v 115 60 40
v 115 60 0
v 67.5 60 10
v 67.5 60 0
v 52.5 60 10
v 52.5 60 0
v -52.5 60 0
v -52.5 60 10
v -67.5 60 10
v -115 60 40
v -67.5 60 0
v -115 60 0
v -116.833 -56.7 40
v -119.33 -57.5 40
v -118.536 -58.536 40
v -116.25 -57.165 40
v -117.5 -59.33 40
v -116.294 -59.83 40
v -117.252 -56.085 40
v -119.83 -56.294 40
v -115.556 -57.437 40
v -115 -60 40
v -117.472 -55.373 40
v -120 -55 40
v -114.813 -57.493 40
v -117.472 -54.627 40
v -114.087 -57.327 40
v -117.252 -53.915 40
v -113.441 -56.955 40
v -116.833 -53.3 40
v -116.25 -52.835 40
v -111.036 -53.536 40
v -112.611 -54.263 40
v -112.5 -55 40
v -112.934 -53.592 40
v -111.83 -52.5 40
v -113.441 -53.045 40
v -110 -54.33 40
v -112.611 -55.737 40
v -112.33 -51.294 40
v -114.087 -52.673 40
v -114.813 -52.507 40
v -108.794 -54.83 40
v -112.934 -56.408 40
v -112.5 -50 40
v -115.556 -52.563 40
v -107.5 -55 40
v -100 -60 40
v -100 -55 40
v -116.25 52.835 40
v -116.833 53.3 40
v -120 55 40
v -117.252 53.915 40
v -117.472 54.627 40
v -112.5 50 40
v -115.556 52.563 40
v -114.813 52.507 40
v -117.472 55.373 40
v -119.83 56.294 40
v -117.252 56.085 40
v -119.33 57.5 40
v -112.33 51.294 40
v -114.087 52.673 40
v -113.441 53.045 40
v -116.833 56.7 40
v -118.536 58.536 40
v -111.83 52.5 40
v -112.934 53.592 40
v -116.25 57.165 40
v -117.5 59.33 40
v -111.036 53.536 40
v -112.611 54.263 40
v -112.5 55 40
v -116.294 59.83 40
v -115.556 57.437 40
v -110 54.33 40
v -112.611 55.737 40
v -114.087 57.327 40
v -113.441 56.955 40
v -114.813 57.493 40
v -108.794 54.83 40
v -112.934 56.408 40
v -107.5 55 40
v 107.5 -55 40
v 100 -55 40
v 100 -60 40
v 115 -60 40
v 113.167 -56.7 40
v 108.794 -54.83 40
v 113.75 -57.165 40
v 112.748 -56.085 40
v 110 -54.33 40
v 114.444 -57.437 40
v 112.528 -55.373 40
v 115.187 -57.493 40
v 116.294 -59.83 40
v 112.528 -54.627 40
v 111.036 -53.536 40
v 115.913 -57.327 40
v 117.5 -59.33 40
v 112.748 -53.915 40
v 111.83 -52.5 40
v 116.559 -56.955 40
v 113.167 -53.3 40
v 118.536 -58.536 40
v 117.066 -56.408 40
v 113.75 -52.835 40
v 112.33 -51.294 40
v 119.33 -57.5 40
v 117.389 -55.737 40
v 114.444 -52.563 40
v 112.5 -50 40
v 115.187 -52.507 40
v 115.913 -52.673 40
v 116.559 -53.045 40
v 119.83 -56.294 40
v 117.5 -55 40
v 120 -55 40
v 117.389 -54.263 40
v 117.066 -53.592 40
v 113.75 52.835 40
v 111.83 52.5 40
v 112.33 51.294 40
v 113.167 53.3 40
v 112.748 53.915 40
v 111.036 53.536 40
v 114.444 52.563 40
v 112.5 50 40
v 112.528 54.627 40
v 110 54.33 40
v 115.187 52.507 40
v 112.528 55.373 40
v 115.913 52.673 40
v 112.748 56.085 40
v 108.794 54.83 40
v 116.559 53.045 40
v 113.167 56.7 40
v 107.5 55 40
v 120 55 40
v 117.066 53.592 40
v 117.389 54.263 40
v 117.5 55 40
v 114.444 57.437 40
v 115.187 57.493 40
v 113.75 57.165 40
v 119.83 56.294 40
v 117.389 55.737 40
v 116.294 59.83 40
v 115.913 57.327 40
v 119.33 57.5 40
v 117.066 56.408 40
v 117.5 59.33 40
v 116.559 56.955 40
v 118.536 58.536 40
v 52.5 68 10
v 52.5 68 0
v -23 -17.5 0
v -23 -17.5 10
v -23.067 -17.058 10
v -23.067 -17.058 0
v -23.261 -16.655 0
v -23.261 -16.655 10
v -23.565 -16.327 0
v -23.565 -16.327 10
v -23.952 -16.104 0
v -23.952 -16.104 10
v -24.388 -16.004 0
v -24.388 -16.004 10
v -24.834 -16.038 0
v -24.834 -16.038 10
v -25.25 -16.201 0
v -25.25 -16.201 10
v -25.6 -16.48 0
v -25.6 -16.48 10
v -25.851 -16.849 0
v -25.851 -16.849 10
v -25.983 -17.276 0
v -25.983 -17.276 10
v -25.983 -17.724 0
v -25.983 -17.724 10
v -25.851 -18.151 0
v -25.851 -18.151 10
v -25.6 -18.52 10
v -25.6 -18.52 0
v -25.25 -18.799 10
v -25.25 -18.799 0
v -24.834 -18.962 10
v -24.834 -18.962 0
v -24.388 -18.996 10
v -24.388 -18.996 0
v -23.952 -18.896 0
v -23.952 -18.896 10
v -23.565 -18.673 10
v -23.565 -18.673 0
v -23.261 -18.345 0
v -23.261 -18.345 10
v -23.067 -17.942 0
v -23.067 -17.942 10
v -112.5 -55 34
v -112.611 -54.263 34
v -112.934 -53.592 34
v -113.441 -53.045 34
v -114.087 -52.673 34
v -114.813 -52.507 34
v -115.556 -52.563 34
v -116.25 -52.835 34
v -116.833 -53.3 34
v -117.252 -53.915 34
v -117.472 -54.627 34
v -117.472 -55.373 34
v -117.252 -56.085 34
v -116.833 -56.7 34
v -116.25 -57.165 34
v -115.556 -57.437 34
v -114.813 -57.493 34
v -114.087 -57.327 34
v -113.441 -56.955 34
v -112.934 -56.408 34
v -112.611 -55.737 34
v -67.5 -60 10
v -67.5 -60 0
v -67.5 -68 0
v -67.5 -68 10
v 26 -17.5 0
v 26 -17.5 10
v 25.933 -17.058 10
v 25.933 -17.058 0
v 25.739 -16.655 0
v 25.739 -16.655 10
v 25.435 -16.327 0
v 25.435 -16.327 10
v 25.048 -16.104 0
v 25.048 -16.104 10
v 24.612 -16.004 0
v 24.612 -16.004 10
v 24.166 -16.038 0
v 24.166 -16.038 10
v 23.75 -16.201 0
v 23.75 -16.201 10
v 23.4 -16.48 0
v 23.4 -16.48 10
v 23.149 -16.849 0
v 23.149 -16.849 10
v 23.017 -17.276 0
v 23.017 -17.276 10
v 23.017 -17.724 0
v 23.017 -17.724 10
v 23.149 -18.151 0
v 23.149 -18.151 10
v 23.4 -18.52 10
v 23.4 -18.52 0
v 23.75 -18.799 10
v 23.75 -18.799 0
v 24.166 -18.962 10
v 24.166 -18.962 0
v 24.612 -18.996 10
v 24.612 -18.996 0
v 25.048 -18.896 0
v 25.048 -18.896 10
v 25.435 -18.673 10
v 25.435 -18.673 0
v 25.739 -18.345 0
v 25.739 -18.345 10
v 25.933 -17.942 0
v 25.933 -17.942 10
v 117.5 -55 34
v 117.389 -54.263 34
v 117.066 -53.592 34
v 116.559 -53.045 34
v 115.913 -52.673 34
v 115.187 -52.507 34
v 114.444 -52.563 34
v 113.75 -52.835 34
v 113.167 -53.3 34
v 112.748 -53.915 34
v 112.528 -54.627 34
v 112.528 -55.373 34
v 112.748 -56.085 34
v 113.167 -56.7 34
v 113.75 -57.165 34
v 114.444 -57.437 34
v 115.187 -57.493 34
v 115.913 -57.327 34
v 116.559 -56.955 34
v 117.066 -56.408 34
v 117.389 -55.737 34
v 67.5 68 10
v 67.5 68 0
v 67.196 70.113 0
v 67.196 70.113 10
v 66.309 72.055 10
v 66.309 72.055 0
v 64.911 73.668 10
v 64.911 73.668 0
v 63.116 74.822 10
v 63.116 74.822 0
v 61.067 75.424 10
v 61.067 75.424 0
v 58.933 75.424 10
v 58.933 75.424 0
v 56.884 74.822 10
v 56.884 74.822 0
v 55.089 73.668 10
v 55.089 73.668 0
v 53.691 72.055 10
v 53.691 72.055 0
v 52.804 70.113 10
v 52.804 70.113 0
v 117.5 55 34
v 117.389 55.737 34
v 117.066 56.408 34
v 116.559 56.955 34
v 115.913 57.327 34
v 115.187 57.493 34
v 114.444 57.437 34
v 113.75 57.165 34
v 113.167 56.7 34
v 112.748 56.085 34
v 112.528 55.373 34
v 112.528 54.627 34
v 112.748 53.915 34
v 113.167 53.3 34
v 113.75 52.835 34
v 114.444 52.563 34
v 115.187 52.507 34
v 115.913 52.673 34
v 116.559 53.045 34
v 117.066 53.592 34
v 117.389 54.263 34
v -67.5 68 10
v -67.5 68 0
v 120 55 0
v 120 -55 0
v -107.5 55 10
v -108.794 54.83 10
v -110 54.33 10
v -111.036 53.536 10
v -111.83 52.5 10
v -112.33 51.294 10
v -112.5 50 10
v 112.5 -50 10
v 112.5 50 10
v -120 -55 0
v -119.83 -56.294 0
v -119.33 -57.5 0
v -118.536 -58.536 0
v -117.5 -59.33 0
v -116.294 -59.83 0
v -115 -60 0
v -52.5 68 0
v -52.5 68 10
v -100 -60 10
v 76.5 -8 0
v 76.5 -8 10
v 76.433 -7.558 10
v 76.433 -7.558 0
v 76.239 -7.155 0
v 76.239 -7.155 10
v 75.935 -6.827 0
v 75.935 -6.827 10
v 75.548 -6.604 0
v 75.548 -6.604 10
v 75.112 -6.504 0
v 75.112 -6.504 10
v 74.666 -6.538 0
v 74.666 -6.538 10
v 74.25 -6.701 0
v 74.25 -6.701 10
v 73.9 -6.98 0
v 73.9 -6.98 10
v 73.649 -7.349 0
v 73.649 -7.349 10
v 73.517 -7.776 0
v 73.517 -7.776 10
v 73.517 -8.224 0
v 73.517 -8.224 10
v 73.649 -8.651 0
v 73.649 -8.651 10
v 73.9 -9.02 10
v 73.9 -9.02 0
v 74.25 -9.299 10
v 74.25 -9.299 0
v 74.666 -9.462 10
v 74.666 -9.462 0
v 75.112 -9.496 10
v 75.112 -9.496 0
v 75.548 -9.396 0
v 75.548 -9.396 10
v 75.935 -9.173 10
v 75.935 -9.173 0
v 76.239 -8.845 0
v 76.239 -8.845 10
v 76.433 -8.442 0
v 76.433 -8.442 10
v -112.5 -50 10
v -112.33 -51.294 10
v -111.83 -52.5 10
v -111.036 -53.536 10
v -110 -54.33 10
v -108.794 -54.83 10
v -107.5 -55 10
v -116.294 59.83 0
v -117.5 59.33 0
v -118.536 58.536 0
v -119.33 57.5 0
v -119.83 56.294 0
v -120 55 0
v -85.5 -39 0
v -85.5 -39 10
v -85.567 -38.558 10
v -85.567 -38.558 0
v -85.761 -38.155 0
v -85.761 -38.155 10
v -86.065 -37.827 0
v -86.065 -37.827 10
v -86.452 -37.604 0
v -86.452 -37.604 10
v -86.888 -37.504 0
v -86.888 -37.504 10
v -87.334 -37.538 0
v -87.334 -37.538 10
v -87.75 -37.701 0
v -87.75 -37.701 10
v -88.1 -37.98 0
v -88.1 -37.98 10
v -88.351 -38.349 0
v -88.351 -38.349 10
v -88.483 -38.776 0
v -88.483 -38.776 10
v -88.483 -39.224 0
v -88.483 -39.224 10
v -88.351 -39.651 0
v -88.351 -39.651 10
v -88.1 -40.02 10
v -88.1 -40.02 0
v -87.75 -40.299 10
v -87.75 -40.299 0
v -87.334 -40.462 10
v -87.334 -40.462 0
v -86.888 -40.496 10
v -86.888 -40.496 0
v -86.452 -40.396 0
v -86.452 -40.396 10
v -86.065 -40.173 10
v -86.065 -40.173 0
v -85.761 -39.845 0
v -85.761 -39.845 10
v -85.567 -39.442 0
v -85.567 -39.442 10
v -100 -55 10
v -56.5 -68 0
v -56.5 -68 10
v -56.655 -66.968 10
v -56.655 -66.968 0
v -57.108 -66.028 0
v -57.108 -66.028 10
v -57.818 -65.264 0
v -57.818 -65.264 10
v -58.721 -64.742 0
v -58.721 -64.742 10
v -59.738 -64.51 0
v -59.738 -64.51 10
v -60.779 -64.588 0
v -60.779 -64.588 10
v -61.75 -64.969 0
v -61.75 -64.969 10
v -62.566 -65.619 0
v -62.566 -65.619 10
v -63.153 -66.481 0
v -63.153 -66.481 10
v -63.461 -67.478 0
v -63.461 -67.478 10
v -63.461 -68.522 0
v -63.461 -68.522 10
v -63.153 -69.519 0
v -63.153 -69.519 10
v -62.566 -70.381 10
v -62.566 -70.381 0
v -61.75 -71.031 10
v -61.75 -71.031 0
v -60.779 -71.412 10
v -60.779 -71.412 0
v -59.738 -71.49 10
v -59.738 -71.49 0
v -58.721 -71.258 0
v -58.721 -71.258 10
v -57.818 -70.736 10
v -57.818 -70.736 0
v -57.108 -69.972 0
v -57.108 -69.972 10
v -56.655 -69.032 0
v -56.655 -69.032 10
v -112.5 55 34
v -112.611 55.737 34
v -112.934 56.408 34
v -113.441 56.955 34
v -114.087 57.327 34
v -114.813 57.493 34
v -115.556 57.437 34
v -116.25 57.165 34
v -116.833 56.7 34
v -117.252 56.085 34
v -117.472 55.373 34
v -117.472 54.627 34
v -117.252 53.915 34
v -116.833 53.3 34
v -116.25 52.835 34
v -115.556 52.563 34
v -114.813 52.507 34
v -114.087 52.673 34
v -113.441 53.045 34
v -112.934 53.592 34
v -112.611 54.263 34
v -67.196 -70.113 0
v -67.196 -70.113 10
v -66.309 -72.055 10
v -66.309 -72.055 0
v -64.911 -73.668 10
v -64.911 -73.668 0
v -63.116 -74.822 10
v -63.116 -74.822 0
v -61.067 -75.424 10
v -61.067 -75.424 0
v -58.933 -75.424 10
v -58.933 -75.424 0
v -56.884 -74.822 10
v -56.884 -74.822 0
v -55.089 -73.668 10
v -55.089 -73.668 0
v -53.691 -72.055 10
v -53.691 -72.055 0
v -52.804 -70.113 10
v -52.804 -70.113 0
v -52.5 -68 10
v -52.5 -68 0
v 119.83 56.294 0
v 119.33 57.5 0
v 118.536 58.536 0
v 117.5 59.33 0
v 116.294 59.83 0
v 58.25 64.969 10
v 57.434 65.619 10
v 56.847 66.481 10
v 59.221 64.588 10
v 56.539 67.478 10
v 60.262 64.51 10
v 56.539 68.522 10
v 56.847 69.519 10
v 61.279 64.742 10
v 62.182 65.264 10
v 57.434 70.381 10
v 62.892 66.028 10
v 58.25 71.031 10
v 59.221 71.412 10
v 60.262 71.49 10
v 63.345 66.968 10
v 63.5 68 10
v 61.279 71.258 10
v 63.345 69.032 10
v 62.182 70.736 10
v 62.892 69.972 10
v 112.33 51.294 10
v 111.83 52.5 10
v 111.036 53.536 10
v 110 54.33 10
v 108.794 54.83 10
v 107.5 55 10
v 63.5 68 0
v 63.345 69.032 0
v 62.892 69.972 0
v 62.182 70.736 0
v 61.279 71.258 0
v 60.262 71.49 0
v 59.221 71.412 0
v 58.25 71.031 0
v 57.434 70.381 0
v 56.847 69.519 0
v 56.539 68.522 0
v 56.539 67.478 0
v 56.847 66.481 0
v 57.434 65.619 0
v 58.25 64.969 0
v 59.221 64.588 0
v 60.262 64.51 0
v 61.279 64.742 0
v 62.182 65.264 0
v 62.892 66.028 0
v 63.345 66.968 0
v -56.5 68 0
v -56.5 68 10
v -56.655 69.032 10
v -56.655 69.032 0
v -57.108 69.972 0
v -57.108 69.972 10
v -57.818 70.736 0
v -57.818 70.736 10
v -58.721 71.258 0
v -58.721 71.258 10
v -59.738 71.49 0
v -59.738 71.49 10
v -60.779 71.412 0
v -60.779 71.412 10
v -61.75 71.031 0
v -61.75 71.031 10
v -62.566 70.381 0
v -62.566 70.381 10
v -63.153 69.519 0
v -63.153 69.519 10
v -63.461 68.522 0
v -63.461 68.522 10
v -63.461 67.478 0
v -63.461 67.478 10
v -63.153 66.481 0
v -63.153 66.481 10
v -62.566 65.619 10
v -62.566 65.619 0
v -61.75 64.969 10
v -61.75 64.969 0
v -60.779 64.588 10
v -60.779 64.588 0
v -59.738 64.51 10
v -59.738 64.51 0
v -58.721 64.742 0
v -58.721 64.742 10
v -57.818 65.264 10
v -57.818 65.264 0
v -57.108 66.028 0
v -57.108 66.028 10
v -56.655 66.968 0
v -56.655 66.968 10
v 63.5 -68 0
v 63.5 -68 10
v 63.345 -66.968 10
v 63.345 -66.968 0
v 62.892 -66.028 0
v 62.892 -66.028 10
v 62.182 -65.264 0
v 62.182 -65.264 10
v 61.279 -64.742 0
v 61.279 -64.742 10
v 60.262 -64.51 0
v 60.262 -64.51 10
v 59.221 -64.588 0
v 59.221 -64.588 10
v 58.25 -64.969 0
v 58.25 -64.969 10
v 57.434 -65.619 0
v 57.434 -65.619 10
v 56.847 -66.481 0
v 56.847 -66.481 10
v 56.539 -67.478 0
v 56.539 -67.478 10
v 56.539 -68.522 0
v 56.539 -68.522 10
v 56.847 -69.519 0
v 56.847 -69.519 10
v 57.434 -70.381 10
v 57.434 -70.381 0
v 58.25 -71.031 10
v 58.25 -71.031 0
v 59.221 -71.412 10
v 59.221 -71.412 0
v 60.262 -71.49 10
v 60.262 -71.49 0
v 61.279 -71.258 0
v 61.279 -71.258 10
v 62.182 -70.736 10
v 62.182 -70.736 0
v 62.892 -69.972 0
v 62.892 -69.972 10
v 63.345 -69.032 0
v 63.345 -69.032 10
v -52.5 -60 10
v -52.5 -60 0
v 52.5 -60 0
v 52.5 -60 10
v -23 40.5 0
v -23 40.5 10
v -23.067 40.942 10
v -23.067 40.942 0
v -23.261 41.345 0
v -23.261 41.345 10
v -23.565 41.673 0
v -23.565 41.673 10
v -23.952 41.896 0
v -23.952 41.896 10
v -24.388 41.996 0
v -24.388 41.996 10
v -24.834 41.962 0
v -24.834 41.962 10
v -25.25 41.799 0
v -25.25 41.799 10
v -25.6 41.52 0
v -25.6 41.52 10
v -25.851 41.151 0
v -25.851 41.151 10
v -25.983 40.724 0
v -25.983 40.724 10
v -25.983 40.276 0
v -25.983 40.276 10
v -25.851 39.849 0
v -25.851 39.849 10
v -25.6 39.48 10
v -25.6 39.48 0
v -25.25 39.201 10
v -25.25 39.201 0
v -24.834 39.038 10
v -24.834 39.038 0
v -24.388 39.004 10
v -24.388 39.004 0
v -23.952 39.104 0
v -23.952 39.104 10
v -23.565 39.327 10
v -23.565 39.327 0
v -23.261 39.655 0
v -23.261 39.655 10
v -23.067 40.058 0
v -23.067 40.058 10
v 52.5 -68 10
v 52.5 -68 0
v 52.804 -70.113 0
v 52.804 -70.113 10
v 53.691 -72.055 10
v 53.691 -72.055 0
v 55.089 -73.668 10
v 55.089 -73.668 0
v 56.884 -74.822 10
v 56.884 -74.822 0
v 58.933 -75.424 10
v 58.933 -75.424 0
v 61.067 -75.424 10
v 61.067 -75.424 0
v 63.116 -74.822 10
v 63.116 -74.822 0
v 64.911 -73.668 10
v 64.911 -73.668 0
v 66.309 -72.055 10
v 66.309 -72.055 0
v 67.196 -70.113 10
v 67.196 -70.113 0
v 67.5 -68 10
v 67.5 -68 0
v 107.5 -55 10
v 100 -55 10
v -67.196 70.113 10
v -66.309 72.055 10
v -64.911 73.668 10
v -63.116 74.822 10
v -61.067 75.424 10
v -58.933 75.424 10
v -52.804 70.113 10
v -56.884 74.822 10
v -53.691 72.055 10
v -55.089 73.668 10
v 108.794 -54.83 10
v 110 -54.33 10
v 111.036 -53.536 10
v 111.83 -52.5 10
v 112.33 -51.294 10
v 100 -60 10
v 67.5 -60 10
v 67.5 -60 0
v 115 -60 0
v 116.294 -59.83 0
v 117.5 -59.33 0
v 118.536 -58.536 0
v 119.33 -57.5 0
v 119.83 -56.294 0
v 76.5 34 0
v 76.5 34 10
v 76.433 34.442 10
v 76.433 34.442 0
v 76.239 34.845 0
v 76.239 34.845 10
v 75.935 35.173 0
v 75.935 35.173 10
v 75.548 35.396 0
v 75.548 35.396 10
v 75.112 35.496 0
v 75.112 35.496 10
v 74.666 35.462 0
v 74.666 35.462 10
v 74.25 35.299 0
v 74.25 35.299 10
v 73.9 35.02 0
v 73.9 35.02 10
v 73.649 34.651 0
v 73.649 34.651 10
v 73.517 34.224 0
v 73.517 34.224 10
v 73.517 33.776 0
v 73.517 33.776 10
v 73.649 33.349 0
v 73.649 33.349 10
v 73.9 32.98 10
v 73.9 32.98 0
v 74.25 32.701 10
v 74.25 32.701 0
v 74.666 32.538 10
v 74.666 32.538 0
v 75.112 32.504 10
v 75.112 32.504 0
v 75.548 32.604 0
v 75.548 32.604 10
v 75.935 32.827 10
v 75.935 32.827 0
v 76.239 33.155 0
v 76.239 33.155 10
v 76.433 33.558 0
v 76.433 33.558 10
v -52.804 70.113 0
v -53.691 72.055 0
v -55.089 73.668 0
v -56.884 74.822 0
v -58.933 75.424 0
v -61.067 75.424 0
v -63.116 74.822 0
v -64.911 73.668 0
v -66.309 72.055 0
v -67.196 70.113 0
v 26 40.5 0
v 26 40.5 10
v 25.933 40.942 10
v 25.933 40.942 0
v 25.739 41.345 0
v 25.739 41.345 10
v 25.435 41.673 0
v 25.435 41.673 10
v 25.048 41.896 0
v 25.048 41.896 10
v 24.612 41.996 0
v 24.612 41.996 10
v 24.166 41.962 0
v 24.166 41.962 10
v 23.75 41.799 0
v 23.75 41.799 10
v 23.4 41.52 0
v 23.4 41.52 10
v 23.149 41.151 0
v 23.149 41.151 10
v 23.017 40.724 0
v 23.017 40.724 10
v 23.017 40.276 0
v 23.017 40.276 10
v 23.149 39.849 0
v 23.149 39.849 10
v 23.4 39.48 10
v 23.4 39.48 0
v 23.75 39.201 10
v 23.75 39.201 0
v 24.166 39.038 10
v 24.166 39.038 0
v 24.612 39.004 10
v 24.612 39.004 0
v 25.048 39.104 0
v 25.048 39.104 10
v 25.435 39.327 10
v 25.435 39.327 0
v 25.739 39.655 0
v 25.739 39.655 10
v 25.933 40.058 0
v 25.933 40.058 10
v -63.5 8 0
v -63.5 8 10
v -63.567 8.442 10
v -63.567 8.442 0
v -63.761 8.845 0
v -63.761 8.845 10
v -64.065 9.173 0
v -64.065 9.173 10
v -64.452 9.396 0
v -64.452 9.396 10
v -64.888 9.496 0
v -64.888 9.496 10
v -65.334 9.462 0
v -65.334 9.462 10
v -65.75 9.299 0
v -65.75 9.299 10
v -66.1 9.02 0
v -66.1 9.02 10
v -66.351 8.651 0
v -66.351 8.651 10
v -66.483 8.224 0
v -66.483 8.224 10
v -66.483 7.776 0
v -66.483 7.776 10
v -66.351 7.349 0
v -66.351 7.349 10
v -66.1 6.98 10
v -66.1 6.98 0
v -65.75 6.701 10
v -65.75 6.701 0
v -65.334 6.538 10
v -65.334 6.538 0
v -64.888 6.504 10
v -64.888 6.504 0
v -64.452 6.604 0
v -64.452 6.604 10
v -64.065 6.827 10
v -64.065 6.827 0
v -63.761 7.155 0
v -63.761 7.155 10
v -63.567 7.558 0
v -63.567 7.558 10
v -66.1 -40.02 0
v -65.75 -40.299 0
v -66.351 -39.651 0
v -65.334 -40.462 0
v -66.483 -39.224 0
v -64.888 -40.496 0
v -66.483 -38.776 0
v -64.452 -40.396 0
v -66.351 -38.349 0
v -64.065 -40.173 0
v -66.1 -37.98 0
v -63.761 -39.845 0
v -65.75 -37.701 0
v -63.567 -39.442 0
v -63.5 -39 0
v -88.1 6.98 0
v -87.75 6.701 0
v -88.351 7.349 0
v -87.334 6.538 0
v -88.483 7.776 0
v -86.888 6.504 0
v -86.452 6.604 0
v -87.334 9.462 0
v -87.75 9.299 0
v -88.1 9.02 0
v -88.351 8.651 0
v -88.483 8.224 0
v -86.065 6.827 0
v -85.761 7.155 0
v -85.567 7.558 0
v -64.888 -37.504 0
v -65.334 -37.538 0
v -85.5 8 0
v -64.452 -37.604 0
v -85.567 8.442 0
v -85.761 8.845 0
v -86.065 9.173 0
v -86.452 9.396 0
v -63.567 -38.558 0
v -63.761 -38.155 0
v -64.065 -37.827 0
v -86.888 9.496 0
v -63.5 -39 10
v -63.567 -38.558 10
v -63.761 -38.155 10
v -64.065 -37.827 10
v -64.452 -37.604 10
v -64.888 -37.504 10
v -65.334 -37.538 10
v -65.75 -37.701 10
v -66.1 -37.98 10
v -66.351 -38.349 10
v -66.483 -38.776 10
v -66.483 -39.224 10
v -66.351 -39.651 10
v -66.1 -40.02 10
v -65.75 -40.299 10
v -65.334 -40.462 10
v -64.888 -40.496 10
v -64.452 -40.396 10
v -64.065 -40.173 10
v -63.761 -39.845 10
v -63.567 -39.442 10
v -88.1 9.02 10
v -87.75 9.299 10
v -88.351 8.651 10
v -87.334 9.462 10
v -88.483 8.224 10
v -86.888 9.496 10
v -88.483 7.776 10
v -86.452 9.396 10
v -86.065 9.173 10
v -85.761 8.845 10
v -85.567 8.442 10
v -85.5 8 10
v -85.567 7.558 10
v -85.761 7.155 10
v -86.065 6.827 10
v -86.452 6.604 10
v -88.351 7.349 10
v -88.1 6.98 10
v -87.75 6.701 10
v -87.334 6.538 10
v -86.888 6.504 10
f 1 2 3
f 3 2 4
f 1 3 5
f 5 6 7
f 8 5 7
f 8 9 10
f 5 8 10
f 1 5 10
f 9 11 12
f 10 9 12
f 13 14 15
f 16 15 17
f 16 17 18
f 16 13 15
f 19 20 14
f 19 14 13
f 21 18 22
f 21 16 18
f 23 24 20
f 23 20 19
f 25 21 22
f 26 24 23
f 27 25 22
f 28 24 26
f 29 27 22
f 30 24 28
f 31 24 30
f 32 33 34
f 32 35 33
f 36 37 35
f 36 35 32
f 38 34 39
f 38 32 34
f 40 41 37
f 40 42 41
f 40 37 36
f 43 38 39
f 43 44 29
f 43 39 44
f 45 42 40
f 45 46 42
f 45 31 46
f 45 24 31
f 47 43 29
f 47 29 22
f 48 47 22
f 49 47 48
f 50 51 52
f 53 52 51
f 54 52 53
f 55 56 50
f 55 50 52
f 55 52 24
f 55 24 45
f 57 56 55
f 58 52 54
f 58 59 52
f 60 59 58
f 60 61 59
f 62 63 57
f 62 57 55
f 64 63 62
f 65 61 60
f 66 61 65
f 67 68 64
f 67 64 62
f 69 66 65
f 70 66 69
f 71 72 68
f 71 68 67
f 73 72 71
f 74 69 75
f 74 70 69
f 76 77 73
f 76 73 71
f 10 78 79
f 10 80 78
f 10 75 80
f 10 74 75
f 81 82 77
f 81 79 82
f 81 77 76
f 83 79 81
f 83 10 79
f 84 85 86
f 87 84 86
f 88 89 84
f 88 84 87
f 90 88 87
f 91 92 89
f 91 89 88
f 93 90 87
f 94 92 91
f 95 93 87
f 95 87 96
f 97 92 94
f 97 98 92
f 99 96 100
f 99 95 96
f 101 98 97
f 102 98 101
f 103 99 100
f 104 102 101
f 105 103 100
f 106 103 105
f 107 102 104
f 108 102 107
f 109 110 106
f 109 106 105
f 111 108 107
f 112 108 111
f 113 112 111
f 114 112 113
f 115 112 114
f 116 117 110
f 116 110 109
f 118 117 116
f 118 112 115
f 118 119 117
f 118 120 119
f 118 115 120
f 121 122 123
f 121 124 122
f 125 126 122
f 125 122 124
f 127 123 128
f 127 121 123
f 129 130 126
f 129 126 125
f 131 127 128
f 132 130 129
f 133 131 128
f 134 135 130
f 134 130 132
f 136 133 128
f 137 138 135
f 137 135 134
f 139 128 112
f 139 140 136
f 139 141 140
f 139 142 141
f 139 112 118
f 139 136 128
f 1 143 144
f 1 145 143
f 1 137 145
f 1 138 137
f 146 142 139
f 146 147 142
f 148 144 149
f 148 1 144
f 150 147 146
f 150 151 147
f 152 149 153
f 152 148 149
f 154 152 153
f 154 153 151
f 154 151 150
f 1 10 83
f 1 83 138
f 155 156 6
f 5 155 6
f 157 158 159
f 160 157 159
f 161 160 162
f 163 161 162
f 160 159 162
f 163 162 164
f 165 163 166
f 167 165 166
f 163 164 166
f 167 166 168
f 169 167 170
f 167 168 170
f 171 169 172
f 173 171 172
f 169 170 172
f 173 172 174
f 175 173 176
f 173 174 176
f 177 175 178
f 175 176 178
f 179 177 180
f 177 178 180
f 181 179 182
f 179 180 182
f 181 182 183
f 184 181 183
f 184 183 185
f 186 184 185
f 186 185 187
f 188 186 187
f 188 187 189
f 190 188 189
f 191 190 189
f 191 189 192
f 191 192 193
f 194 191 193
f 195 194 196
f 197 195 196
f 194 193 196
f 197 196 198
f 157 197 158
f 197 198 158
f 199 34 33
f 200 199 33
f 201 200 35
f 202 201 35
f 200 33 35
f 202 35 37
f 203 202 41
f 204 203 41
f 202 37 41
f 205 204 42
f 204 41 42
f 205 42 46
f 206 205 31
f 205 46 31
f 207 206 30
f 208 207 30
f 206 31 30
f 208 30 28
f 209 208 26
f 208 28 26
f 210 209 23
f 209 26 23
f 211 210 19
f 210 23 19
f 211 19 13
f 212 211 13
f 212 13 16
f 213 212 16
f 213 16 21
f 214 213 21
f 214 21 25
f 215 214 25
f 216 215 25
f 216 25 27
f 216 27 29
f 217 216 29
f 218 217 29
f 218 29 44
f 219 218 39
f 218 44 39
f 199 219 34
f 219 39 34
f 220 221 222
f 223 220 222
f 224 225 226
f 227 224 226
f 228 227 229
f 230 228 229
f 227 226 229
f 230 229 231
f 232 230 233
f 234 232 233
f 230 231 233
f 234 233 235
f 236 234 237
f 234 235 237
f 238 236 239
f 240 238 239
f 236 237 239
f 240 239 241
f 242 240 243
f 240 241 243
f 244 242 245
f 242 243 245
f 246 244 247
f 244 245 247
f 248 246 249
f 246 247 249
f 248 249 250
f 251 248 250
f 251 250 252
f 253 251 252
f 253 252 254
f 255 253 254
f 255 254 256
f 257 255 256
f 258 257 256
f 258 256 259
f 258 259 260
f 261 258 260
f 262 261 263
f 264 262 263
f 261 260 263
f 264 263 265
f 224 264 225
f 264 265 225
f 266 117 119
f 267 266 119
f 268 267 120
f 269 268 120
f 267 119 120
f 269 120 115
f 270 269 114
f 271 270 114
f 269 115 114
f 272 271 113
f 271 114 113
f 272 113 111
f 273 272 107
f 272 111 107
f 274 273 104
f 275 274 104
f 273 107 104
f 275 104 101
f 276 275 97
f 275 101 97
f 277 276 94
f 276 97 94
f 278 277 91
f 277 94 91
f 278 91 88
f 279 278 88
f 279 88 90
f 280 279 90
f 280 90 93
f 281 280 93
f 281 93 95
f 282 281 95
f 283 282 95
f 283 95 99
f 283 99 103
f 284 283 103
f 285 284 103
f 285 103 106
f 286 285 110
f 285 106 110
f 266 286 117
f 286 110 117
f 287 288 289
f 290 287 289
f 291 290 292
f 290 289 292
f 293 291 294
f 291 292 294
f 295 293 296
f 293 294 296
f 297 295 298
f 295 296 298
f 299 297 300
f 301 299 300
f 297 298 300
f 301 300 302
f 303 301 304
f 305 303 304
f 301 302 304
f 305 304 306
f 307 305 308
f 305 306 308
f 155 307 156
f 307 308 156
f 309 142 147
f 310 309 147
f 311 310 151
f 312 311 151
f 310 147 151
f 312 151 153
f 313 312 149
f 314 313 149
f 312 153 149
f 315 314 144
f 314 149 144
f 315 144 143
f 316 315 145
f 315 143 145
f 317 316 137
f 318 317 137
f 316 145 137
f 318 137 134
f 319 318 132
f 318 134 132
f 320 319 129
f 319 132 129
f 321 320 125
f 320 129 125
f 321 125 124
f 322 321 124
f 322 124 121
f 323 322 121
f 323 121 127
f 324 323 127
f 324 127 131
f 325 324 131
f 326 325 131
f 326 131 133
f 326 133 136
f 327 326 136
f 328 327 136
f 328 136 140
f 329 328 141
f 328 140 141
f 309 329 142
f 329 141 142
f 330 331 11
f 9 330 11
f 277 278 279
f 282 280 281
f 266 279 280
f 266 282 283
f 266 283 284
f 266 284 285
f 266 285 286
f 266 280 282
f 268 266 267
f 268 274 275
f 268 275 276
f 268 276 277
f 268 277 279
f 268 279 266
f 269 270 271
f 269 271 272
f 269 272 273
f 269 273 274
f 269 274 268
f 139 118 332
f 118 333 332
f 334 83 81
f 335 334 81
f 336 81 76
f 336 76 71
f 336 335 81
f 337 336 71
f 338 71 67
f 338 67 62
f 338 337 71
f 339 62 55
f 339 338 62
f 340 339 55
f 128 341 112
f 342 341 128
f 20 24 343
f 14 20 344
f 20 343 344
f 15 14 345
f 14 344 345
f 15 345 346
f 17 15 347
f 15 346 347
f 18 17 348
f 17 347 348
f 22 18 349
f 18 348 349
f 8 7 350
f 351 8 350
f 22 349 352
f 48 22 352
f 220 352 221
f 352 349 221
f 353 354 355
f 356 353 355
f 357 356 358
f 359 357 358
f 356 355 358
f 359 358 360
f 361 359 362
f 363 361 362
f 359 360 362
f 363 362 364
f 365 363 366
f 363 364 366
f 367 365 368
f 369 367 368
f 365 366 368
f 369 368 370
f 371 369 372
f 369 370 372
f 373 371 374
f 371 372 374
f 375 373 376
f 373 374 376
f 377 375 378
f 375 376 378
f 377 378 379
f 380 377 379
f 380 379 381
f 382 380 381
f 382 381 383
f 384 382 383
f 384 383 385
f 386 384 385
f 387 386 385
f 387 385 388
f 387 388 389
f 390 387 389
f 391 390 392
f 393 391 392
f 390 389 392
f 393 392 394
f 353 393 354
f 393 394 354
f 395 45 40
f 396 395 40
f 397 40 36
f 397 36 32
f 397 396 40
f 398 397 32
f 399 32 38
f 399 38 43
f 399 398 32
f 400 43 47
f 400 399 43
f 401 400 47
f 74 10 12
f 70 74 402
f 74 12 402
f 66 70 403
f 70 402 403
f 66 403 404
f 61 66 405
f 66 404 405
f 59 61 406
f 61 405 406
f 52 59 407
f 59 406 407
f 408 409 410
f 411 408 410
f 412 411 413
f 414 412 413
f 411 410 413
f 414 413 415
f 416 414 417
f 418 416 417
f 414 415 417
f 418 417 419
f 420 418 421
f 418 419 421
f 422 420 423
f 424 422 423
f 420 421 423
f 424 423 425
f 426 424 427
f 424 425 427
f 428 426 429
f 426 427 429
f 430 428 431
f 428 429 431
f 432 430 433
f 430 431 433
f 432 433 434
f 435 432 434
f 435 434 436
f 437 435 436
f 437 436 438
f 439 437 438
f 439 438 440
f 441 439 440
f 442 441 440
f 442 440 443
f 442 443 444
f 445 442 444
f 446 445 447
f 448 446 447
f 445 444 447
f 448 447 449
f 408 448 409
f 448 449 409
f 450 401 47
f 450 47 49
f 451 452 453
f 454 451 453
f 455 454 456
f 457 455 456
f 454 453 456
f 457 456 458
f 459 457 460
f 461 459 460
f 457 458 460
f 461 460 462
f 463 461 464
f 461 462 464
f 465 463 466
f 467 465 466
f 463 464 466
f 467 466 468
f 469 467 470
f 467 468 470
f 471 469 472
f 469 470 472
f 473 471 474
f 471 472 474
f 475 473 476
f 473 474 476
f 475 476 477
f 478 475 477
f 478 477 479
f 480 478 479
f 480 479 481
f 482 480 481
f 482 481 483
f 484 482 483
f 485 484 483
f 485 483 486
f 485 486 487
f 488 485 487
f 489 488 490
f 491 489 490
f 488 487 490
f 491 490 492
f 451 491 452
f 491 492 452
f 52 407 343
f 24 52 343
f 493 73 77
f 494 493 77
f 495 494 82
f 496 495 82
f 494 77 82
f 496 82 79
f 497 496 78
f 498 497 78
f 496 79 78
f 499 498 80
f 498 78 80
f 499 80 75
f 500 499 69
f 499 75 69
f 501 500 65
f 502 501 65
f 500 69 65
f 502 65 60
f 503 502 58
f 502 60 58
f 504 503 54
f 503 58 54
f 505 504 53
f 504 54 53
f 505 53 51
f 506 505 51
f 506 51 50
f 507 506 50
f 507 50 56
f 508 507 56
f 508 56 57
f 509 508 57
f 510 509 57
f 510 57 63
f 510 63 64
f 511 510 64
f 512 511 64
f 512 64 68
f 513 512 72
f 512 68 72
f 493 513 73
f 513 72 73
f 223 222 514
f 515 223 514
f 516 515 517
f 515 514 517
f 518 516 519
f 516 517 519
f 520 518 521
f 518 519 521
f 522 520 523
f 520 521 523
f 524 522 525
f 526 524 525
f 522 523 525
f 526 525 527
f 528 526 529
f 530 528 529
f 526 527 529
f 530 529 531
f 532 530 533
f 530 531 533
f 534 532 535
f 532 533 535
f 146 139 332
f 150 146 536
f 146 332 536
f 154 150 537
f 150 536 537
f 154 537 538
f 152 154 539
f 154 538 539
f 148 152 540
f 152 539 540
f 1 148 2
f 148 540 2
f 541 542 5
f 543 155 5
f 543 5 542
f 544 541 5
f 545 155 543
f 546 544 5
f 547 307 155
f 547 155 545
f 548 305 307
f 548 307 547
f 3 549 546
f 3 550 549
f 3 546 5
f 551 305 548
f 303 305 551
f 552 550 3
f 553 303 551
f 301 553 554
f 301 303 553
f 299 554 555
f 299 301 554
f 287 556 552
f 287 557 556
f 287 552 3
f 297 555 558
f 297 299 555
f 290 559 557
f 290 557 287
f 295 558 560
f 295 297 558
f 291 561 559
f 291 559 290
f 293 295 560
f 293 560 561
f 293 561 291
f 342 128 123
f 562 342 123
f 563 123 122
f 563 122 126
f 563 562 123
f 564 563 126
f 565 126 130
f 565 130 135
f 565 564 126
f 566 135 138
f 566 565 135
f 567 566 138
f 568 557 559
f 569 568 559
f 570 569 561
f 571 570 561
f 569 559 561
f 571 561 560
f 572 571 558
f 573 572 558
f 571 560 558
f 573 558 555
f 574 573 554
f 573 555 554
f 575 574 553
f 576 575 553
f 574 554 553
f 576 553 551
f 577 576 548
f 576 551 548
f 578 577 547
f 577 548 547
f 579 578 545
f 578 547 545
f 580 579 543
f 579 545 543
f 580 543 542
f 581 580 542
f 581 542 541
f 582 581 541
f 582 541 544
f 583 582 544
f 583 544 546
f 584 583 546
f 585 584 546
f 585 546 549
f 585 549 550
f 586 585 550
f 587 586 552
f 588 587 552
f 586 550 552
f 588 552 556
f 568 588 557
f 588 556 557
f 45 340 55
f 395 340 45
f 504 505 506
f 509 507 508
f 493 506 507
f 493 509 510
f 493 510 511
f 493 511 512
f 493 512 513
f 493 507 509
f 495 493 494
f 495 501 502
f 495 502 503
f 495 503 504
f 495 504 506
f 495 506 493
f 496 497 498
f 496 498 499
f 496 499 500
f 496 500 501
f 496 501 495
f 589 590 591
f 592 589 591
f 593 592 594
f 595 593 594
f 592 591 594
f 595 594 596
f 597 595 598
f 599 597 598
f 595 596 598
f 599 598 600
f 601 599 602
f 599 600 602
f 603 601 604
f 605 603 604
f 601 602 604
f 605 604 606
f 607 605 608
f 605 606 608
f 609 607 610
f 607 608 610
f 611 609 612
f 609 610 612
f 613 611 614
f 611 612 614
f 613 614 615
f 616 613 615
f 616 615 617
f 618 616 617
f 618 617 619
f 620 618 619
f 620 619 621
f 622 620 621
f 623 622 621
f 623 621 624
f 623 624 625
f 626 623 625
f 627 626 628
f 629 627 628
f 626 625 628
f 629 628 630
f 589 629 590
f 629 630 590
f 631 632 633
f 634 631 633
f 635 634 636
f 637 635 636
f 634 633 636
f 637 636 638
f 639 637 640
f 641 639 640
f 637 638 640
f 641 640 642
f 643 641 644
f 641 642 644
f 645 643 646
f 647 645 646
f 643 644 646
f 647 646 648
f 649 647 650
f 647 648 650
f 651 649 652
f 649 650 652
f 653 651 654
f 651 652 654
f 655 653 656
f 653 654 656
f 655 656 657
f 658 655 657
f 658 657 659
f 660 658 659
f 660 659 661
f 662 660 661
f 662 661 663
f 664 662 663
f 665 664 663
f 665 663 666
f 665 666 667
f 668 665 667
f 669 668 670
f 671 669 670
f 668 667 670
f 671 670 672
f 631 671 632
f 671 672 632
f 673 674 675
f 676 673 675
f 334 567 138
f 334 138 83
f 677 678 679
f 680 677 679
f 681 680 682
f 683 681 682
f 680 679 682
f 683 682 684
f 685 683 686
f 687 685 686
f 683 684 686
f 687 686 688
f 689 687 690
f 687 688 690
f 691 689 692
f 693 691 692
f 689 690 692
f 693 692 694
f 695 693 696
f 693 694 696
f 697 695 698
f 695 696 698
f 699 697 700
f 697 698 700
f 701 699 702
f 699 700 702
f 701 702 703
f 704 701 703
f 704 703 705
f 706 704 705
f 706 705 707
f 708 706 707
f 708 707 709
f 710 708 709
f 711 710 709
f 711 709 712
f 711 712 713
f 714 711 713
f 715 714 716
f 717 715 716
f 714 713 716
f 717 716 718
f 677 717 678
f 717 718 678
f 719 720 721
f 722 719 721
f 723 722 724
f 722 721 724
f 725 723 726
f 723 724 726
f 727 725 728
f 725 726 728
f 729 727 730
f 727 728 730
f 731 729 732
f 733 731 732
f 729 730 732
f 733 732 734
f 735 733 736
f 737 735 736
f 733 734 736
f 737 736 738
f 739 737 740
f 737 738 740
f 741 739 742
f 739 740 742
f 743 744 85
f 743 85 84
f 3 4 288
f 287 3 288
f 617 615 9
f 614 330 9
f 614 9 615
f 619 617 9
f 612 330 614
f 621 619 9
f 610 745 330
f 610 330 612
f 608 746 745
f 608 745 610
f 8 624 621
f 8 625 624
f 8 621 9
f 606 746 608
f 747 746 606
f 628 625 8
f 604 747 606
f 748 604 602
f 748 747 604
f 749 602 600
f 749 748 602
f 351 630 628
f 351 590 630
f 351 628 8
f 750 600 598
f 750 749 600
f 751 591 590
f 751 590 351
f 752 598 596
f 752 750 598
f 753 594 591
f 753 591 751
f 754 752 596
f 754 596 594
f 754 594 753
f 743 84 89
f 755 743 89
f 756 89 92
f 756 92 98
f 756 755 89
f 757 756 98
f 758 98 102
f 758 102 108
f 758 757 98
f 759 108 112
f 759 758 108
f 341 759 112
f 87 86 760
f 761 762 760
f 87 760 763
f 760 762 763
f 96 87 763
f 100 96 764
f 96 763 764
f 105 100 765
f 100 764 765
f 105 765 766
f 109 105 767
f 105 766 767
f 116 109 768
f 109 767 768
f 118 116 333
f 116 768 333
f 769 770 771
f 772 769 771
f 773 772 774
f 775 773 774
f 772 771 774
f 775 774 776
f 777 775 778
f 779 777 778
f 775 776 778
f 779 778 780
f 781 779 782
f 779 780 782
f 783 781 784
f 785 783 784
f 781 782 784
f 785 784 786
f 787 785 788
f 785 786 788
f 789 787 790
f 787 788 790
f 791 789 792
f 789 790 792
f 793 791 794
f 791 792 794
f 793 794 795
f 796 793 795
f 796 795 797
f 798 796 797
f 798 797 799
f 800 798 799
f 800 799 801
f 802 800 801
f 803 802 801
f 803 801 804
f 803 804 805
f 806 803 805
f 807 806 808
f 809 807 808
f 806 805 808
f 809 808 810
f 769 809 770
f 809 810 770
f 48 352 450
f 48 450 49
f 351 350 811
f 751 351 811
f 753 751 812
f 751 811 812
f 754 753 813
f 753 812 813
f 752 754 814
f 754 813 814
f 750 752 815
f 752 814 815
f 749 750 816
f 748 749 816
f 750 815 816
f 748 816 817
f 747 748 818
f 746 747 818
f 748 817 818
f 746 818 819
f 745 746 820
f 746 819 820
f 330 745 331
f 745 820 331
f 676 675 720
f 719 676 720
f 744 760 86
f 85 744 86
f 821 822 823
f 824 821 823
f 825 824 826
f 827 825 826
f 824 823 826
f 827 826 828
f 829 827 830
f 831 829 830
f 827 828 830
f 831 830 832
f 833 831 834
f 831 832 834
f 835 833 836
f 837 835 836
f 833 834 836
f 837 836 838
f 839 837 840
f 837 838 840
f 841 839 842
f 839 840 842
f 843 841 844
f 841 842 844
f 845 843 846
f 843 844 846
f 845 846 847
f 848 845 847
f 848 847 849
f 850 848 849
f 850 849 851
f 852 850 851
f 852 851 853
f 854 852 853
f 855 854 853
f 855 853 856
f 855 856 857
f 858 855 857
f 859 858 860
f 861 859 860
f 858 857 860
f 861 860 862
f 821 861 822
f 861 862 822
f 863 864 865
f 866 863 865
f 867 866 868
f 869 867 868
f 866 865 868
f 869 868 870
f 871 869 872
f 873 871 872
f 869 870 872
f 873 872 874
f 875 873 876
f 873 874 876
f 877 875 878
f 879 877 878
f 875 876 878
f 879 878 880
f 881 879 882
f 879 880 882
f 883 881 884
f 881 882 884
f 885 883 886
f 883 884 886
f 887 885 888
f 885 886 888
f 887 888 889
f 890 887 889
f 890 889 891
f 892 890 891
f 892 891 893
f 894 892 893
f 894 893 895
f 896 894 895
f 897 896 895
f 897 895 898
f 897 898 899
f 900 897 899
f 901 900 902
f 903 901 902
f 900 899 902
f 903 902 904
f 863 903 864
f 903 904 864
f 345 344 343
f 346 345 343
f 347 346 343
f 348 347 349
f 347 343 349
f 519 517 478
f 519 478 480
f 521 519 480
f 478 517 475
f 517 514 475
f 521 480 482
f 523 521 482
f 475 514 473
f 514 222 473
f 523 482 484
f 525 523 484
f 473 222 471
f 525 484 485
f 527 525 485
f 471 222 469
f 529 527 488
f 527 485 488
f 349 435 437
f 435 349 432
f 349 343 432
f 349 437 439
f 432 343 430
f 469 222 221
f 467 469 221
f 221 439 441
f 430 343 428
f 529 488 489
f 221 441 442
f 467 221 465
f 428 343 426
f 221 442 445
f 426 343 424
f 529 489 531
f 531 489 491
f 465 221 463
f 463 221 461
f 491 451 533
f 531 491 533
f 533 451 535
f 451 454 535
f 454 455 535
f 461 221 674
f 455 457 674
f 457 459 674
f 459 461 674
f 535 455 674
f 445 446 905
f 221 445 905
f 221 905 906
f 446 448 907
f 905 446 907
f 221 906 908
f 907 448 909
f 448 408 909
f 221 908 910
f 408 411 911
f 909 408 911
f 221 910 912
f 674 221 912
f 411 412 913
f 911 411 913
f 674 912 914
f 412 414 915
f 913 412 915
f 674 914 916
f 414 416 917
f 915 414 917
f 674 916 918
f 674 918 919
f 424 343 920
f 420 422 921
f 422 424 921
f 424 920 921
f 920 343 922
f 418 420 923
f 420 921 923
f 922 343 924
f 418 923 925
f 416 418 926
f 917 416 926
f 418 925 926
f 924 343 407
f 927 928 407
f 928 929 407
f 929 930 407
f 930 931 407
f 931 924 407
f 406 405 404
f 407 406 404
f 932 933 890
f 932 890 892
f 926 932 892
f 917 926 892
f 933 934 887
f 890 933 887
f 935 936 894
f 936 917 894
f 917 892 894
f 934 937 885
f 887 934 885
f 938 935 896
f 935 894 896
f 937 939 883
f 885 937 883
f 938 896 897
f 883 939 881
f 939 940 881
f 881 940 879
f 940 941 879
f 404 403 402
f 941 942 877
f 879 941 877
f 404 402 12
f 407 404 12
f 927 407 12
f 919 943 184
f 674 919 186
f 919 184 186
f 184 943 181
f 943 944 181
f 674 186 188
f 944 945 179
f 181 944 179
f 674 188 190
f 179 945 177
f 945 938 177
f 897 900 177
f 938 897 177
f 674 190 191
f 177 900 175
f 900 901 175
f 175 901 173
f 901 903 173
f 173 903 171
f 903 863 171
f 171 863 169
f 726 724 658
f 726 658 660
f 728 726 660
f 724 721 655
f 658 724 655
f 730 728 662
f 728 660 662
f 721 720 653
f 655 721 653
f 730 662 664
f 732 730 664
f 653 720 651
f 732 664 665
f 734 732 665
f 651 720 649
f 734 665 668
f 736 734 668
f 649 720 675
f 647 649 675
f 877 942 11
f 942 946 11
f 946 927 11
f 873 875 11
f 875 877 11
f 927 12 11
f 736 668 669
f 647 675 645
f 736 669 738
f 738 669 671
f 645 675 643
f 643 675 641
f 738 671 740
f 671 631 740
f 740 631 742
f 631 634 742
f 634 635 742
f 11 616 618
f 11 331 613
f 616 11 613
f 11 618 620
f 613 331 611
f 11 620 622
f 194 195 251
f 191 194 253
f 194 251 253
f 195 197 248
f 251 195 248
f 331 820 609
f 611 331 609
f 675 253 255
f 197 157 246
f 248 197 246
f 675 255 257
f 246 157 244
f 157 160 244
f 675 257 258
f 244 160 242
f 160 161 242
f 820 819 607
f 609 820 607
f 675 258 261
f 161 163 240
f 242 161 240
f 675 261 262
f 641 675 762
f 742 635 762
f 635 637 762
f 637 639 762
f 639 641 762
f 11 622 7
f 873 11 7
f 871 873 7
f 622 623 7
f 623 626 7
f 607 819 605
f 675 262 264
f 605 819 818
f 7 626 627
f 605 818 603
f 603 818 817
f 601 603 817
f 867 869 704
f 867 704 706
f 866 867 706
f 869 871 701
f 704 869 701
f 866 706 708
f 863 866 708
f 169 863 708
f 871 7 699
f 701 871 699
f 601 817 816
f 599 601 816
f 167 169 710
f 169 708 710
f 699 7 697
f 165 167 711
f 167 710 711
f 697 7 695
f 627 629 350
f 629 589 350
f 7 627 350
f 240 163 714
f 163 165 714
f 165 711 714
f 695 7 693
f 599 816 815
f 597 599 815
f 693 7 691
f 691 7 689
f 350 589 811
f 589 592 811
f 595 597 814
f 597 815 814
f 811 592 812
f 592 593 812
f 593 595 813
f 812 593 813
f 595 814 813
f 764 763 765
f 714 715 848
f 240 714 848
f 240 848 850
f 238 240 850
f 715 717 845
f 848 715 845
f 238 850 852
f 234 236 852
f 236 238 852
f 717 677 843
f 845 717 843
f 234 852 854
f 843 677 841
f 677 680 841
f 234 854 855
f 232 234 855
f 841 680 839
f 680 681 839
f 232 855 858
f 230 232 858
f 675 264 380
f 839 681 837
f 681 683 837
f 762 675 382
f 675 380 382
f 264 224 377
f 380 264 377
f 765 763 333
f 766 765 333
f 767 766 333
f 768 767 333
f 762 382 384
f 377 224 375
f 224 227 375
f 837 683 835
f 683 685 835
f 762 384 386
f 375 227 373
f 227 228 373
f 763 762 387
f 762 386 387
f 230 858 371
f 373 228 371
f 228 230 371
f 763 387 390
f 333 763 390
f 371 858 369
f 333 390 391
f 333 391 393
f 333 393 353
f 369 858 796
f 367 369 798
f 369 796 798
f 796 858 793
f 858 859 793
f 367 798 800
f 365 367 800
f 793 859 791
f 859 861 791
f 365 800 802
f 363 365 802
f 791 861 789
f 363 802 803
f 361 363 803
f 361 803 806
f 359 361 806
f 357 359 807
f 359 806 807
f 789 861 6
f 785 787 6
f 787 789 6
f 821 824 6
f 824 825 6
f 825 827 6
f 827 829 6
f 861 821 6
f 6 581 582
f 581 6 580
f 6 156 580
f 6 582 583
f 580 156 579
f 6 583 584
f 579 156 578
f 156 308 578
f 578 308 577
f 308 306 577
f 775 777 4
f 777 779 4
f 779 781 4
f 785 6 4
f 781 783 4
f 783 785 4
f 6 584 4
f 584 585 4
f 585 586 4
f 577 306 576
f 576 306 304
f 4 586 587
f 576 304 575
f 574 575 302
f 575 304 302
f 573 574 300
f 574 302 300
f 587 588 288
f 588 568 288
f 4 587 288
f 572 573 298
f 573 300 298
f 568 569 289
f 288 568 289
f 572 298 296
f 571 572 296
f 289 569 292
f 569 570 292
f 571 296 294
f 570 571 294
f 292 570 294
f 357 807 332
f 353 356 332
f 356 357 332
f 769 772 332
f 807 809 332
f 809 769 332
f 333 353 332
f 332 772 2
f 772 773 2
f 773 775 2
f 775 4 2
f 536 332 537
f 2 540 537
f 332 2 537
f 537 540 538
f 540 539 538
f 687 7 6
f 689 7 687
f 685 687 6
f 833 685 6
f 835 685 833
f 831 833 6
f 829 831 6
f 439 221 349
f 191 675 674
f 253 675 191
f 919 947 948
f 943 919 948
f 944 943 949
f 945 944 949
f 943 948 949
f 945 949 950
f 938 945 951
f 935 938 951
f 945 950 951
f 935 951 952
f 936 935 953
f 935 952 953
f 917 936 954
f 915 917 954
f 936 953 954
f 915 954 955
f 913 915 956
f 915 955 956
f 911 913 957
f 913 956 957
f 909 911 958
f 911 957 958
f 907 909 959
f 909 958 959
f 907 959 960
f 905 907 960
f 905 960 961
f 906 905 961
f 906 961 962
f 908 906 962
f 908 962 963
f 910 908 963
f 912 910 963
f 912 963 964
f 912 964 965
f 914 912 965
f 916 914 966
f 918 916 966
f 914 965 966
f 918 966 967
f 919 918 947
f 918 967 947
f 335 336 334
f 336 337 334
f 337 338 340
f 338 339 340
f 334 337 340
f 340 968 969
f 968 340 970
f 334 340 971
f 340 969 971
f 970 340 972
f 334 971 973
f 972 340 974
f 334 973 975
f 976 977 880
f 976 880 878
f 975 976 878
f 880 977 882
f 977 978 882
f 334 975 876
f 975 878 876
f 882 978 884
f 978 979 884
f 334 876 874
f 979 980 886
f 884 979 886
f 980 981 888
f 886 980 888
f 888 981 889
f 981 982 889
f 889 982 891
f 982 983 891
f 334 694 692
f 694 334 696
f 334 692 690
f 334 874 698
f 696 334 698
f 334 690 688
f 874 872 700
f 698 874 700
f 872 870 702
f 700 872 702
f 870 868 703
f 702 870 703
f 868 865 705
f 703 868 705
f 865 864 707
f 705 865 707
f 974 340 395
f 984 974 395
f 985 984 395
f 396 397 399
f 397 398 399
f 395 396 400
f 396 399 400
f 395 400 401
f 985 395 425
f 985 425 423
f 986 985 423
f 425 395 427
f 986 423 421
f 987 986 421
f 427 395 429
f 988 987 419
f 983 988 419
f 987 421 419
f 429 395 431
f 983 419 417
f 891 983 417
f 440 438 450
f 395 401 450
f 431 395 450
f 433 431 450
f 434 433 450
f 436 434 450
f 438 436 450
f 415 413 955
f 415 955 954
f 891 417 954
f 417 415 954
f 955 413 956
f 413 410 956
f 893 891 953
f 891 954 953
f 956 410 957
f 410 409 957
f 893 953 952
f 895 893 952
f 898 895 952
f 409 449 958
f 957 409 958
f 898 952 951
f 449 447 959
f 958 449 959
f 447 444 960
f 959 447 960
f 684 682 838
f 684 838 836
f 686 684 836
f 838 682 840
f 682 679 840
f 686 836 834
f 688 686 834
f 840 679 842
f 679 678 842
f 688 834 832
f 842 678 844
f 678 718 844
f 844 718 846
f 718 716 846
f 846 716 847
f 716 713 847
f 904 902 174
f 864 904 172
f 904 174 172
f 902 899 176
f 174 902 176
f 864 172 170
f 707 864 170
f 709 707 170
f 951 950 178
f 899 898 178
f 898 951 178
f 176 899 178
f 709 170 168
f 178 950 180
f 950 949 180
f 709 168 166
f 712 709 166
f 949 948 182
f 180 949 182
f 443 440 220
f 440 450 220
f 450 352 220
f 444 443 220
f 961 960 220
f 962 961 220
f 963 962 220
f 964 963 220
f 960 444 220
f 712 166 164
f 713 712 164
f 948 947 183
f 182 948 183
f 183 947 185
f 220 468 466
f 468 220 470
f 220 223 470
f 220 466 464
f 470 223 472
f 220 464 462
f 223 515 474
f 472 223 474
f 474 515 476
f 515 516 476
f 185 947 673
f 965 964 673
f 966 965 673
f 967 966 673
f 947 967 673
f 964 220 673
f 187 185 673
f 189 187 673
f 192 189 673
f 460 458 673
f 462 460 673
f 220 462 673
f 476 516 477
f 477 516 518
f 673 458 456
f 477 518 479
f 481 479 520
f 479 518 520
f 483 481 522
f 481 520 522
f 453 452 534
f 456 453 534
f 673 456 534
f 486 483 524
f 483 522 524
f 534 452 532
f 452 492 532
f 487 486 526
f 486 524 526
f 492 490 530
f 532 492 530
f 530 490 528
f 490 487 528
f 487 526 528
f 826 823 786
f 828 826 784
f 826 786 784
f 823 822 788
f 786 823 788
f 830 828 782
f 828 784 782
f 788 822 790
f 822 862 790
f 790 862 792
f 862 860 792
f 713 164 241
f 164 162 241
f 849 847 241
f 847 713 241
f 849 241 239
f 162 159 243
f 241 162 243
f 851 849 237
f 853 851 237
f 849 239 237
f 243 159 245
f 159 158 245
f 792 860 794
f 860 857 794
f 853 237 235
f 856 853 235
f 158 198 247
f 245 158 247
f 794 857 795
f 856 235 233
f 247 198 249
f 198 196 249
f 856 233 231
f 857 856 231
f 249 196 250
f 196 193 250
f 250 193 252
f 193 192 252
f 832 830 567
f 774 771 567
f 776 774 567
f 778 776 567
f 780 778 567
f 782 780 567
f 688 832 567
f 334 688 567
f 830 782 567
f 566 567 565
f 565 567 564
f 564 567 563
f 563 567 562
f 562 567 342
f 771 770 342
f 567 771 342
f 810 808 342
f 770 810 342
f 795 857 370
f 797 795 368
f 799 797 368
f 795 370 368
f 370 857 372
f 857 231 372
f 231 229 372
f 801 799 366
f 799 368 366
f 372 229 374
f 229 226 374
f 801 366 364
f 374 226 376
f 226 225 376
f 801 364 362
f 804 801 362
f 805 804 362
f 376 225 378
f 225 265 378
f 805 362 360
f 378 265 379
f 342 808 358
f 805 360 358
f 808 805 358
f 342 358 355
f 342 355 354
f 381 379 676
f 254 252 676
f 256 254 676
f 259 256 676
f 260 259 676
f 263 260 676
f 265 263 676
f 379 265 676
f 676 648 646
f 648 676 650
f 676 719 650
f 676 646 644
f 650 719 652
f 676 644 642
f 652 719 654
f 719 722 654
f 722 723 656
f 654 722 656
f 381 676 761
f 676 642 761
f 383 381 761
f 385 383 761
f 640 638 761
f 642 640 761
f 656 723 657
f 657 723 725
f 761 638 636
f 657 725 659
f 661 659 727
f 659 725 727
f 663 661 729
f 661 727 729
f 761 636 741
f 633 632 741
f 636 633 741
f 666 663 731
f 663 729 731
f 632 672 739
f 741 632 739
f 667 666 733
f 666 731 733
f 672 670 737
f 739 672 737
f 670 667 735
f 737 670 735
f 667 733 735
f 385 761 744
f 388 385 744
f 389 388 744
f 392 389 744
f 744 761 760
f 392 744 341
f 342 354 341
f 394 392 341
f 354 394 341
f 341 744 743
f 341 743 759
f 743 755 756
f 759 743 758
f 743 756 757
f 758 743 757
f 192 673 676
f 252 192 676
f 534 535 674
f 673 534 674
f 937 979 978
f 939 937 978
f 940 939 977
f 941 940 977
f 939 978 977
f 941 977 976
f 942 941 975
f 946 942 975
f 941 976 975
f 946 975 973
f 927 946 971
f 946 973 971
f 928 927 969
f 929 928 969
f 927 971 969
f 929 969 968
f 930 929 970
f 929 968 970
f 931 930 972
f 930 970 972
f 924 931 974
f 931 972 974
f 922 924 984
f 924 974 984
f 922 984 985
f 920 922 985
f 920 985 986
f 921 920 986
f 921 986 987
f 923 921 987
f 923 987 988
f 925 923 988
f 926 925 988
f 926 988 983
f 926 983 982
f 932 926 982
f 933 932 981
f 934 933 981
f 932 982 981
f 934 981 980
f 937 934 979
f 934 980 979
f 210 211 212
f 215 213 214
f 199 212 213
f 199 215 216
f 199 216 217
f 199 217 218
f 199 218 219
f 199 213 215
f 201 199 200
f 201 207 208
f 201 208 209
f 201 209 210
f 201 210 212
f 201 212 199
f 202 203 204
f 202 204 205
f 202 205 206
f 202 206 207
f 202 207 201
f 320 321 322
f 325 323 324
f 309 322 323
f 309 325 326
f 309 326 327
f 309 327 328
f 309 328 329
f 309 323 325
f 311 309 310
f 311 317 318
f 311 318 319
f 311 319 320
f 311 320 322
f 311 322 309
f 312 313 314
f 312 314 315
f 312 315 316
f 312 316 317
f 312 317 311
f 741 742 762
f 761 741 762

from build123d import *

# Parameters (mm, degrees)
BOSS_EXTRUDE1_DEPTH                 = 10
SKETCH3_R                           = 3.5
IZVRTINA_VIJACENJE_NOSILCA_M7_DEPTH = 10
BOSS_EXTRUDE2_DEPTH                 = 30
SKETCH8_W                           = 200
SKETCH8_H                           = 30
IZVRTINA_KABLI_DEPTH                = 5
SKETCH10_R                          = 1.5
IZVRTINE_RPI_M2_5_HEAT_INSERT_DEPTH = 10
SKETCH11_R                          = 1.5
IZVRTINE_BUCK_M2_HEAT_INSERTS_DEPTH = 10
SKETCH12_R                          = 1.5
IZVRTINE_UNO_M2_5_HEAT_INSERT_DEPTH = 10
SKETCH14_R                          = 2.5
IZVRTINE_TOP_M4_HEAT_INSERT_DEPTH   = 6


with BuildPart() as part:
    # Sketch2 → Boss-Extrude1 (new body)
    with BuildSketch(Plane.XY):
        with BuildLine():
            Line((52.5, 60), (-52.5, 60))
            Line((-52.5, 60), (-52.5, 68))
            ThreePointArc((-52.5, 68), (-60, 75.5), (-67.5, 68))
            Line((-67.5, 68), (-67.5, 60))
            Line((-67.5, 60), (-115, 60))
            ThreePointArc((-115, 60), (-118.535533906, 58.535533906), (-120, 55))
            Line((-120, 55), (-120, -55))
            ThreePointArc((-120, -55), (-118.535533906, -58.535533906), (-115, -60))
            Line((-115, -60), (-67.5, -60))
            Line((-67.5, -60), (-67.5, -68))
            ThreePointArc((-67.5, -68), (-60, -75.5), (-52.5, -68))
            Line((-52.5, -68), (-52.5, -60))
            Line((-52.5, -60), (52.5, -60))
            Line((52.5, -60), (52.5, -68))
            ThreePointArc((52.5, -68), (60, -75.5), (67.5, -68))
            Line((67.5, -68), (67.5, -60))
            Line((67.5, -60), (115, -60))
            ThreePointArc((115, -60), (118.535533906, -58.535533906), (120, -55))
            Line((120, -55), (120, 55))
            ThreePointArc((120, 55), (118.535533906, 58.535533906), (115, 60))
            Line((115, 60), (67.5, 60))
            Line((67.5, 60), (67.5, 68))
            ThreePointArc((67.5, 68), (60, 75.5), (52.5, 68))
            Line((52.5, 68), (52.5, 60))
        make_face()
    extrude(amount=BOSS_EXTRUDE1_DEPTH)

    # Sketch3 → izvrtina_vijacenje_nosilca_m7 (cut)
    with BuildSketch(Plane.XY.offset(10)):
        with Locations((-60, 68)):
            Circle(SKETCH3_R)
        with Locations((-60, -68)):
            Circle(SKETCH3_R)
        with Locations((60, -68)):
            Circle(SKETCH3_R)
        with Locations((60, 68)):
            Circle(SKETCH3_R)
    extrude(amount=-IZVRTINA_VIJACENJE_NOSILCA_M7_DEPTH, mode=Mode.SUBTRACT)

    # Sketch7 → Boss-Extrude2 (add)
    with BuildSketch(Plane.XY.offset(10)):
        with BuildLine():
            Line((-115, -60), (115, -60))
            ThreePointArc((115, -60), (118.535533906, -58.535533906), (120, -55))
            Line((120, -55), (120, 55))
            ThreePointArc((120, 55), (118.535533906, 58.535533906), (115, 60))
            Line((115, 60), (-115, 60))
            ThreePointArc((-115, 60), (-118.535533906, 58.535533906), (-120, 55))
            Line((-120, 55), (-120, -55))
            ThreePointArc((-120, -55), (-118.535533906, -58.535533906), (-115, -60))
        make_face()
        with BuildLine():
            Line((-112.5, 50), (-112.5, -50))
            ThreePointArc((-112.5, -50), (-111.035533906, -53.535533906), (-107.5, -55))
            Line((-107.5, -55), (107.5, -55))
            ThreePointArc((107.5, -55), (111.035533906, -53.535533906), (112.5, -50))
            Line((112.5, -50), (112.5, 50))
            ThreePointArc((112.5, 50), (111.035533906, 53.535533906), (107.5, 55))
            Line((107.5, 55), (-107.5, 55))
            ThreePointArc((-107.5, 55), (-111.035533906, 53.535533906), (-112.5, 50))
        make_face(mode=Mode.SUBTRACT)
    extrude(amount=BOSS_EXTRUDE2_DEPTH)

    # Sketch8 → izvrtina_kabli (cut)
    with BuildSketch(Plane.XZ.offset(60)):
        with Locations((0, 25)):
            Rectangle(SKETCH8_W, SKETCH8_H)
    extrude(amount=-IZVRTINA_KABLI_DEPTH, mode=Mode.SUBTRACT)

    # Sketch10 → izvrtine_rpi_m2.5_heat_insert (cut)
    with BuildSketch(Plane.XY.offset(10)):
        with Locations((24.5, 40.5)):
            Circle(SKETCH10_R)
        with Locations((24.5, -17.5)):
            Circle(SKETCH10_R)
        with Locations((-24.5, -17.5)):
            Circle(SKETCH10_R)
        with Locations((-24.5, 40.5)):
            Circle(SKETCH10_R)
    extrude(amount=-IZVRTINE_RPI_M2_5_HEAT_INSERT_DEPTH, mode=Mode.SUBTRACT)

    # Sketch11 → izvrtine_buck_m2_heat_inserts (cut)
    with BuildSketch(Plane.XY.offset(10)):
        with Locations((-87, 8)):
            Circle(SKETCH11_R)
        with Locations((-65, 8)):
            Circle(SKETCH11_R)
        with Locations((-65, -39)):
            Circle(SKETCH11_R)
        with Locations((-87, -39)):
            Circle(SKETCH11_R)
    extrude(amount=-IZVRTINE_BUCK_M2_HEAT_INSERTS_DEPTH, mode=Mode.SUBTRACT)

    # Sketch12 → izvrtine_uno_m2.5_heat_insert (cut)
    with BuildSketch(Plane.XY.offset(10)):
        with Locations((75, 34)):
            Circle(SKETCH12_R)
        with Locations((75, -8)):
            Circle(SKETCH12_R)
    extrude(amount=-IZVRTINE_UNO_M2_5_HEAT_INSERT_DEPTH, mode=Mode.SUBTRACT)

    # Sketch14 → izvrtine_top_m4_heat_insert (cut)
    with BuildSketch(Plane.XY.offset(40)):
        with Locations((-115, 55)):
            Circle(SKETCH14_R)
        with Locations((115, 55)):
            Circle(SKETCH14_R)
        with Locations((115, -55)):
            Circle(SKETCH14_R)
        with Locations((-115, -55)):
            Circle(SKETCH14_R)
    extrude(amount=-IZVRTINE_TOP_M4_HEAT_INSERT_DEPTH, mode=Mode.SUBTRACT)


solid = part.part
